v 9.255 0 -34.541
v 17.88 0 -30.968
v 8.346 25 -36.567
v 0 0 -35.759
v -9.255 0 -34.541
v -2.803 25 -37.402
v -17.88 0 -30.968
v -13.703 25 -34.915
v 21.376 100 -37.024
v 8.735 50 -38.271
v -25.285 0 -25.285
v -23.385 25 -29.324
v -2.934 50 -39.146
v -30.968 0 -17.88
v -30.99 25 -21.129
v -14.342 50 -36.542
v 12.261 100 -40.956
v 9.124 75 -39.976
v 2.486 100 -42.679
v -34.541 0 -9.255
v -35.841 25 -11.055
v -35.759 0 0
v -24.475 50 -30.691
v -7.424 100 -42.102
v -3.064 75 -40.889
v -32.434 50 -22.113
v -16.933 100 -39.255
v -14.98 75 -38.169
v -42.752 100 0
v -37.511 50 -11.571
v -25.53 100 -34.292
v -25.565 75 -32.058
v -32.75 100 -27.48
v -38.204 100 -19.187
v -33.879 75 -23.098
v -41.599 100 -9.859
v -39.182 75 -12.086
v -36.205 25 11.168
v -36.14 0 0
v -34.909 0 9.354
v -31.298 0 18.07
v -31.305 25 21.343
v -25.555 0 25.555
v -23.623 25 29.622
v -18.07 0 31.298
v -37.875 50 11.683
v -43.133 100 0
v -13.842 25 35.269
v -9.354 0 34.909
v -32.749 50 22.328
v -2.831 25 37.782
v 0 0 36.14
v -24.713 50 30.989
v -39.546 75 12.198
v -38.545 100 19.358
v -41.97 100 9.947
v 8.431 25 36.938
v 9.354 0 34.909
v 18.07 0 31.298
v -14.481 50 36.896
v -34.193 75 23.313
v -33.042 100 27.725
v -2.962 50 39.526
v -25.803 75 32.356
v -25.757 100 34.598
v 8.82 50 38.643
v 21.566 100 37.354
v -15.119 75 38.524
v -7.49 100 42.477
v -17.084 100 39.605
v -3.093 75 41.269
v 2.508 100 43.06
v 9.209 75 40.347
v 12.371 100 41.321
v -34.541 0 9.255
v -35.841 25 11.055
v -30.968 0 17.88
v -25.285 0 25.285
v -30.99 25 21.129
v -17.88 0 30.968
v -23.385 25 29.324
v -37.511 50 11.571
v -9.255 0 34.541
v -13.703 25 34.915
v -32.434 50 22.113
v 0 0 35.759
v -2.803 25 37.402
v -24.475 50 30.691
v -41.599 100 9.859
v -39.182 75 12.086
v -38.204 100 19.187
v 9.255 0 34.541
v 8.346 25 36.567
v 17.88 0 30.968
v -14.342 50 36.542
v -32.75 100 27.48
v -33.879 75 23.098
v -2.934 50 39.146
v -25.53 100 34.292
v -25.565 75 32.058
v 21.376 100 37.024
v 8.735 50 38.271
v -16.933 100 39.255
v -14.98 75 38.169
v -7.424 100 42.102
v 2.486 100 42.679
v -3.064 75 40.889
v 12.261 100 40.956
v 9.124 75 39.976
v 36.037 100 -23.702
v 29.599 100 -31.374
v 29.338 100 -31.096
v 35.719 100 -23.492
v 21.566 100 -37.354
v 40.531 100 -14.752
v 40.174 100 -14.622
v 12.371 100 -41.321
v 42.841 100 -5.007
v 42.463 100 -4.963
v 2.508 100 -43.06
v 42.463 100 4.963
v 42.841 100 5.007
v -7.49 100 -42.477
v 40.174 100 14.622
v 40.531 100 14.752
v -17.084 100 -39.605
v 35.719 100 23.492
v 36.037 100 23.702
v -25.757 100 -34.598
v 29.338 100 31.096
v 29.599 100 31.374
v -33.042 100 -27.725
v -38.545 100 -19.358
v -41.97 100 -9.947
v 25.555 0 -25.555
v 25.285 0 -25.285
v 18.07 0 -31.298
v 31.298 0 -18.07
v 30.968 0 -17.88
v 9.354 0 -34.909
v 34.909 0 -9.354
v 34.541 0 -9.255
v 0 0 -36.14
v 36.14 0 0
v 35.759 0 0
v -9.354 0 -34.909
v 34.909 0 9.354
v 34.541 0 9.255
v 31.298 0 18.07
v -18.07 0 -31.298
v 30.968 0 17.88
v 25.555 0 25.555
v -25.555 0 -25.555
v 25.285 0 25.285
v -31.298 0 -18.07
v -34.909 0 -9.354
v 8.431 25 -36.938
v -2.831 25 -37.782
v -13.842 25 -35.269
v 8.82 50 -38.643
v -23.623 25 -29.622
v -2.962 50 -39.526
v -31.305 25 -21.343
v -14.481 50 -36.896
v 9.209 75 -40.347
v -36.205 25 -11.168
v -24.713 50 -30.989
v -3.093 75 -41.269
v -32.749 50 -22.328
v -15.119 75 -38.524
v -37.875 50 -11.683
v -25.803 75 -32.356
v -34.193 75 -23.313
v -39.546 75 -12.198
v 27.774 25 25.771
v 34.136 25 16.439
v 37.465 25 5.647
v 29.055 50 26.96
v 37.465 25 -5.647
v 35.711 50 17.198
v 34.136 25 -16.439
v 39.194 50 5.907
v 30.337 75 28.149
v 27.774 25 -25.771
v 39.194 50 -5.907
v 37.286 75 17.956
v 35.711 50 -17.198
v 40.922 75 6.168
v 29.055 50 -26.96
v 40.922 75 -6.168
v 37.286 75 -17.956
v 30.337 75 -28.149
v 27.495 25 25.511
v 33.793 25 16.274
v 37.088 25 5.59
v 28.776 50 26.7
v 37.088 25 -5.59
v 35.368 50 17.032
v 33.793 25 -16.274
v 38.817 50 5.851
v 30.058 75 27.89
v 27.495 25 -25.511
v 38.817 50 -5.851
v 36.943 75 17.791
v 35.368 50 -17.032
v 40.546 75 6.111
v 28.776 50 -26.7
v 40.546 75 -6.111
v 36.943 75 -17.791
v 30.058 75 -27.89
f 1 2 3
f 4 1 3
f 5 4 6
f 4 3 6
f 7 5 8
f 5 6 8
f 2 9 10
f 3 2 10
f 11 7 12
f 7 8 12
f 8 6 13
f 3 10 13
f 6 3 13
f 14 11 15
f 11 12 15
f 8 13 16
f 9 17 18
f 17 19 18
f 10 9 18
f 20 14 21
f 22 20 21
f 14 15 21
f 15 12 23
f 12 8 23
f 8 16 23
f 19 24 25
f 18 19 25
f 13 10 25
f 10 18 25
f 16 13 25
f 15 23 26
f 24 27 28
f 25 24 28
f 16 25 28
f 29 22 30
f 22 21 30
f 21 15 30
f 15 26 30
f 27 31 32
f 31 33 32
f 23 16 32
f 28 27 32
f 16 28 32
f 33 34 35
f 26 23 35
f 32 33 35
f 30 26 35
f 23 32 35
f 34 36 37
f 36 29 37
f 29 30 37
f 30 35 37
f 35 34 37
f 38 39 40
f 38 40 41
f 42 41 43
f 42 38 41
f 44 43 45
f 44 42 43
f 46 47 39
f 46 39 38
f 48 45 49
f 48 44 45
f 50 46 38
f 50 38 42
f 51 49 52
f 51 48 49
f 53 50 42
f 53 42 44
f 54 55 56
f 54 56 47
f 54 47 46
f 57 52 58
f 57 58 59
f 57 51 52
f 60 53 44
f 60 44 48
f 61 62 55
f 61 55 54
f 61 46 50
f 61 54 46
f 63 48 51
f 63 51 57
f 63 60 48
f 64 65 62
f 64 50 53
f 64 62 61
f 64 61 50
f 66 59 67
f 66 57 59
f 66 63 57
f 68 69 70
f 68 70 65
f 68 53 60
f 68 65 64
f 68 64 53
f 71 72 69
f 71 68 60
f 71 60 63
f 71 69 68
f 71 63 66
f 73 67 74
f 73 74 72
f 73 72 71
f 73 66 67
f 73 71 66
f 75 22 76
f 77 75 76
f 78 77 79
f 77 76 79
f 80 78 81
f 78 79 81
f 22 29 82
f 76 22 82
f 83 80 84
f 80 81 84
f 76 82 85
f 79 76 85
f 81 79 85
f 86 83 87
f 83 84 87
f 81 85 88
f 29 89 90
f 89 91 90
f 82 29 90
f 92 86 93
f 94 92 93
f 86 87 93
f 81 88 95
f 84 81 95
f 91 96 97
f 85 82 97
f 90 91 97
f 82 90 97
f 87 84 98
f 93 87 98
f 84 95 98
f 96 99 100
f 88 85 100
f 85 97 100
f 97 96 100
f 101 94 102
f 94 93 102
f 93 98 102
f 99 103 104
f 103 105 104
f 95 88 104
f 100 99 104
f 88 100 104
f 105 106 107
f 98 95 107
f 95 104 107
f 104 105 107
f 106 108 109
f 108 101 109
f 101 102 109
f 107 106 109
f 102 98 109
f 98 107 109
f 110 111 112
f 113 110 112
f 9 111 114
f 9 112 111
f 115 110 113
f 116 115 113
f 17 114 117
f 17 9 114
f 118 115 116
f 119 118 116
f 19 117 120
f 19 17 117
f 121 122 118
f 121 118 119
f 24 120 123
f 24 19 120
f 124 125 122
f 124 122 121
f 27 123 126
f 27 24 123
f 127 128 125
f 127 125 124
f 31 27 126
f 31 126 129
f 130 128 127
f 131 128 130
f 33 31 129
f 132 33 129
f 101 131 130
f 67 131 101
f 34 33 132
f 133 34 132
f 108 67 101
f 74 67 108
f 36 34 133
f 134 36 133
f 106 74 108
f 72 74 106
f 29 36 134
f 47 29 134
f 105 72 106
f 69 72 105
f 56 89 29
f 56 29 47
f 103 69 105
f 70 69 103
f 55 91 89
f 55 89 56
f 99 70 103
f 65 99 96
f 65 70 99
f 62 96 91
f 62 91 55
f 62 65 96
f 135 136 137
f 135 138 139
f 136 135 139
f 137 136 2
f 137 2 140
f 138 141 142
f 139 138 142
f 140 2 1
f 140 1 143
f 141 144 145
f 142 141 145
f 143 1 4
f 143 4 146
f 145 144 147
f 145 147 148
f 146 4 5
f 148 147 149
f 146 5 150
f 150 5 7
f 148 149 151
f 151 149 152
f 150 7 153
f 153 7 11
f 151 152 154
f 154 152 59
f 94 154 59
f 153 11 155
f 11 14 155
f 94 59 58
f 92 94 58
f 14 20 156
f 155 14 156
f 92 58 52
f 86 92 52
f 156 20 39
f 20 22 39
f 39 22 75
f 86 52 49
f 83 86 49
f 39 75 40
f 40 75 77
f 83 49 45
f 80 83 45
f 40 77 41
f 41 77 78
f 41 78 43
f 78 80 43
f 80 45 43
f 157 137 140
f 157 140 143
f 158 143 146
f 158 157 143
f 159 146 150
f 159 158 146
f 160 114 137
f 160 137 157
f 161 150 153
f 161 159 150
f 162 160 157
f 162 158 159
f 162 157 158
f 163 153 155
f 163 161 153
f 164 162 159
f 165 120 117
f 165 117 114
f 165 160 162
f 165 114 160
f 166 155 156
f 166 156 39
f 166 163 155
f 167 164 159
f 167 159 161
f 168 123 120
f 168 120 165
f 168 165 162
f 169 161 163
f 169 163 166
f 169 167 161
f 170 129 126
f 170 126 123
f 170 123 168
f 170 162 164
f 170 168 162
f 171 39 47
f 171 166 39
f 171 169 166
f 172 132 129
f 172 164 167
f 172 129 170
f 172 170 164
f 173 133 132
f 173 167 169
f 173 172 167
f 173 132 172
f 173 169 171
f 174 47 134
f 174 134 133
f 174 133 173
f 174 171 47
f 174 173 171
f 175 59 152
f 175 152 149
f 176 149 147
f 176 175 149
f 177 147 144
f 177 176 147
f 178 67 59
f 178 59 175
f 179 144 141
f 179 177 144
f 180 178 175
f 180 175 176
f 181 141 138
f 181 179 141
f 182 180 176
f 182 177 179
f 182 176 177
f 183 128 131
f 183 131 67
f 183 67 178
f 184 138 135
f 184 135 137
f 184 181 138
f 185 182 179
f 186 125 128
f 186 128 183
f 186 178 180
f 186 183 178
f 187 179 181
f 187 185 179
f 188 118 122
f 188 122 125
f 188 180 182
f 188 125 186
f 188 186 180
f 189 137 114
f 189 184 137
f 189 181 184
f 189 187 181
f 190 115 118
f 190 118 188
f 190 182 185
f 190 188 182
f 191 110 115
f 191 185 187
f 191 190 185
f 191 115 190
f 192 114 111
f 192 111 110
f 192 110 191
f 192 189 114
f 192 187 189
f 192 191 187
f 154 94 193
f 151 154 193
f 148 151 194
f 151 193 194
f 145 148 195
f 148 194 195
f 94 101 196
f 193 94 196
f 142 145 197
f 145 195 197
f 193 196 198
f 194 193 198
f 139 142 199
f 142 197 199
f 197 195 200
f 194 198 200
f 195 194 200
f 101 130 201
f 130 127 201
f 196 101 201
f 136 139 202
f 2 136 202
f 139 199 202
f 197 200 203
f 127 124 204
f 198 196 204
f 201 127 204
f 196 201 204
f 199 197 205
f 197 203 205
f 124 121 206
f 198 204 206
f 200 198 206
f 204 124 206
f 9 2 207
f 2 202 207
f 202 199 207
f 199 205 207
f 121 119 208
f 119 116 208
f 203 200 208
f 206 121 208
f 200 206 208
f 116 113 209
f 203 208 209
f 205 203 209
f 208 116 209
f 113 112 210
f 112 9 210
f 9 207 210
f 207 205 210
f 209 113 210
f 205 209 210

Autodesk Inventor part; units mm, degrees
ref_plane "YZ Plane" through (0, 0, 0) normal (1, 0, 0) x (0, 1, 0)
ref_plane "XZ Plane" through (0, 0, 0) normal (0, 1, 0) x (-1, 0, 0)
ref_plane "XY Plane" through (0, 0, 0) normal (0, 0, 1) x (1, 0, 0)
sketch "Sketch1" plane through (0, 0, 0) normal (0, 1, 0) x (-1, 0, 0)
  circle A0 centre (0, 0) radius 36.14
  dimension "d0" = 72.28
extrude "Extrusion1" add sketch "Sketch1" along normal blind 100 draft 4
shell "Shell1" thickness 0.38 removed faces 2 at (-7.9764, 0, 7.1147) at (-8.1176, 100, 9.5927)
properties part number "E"
